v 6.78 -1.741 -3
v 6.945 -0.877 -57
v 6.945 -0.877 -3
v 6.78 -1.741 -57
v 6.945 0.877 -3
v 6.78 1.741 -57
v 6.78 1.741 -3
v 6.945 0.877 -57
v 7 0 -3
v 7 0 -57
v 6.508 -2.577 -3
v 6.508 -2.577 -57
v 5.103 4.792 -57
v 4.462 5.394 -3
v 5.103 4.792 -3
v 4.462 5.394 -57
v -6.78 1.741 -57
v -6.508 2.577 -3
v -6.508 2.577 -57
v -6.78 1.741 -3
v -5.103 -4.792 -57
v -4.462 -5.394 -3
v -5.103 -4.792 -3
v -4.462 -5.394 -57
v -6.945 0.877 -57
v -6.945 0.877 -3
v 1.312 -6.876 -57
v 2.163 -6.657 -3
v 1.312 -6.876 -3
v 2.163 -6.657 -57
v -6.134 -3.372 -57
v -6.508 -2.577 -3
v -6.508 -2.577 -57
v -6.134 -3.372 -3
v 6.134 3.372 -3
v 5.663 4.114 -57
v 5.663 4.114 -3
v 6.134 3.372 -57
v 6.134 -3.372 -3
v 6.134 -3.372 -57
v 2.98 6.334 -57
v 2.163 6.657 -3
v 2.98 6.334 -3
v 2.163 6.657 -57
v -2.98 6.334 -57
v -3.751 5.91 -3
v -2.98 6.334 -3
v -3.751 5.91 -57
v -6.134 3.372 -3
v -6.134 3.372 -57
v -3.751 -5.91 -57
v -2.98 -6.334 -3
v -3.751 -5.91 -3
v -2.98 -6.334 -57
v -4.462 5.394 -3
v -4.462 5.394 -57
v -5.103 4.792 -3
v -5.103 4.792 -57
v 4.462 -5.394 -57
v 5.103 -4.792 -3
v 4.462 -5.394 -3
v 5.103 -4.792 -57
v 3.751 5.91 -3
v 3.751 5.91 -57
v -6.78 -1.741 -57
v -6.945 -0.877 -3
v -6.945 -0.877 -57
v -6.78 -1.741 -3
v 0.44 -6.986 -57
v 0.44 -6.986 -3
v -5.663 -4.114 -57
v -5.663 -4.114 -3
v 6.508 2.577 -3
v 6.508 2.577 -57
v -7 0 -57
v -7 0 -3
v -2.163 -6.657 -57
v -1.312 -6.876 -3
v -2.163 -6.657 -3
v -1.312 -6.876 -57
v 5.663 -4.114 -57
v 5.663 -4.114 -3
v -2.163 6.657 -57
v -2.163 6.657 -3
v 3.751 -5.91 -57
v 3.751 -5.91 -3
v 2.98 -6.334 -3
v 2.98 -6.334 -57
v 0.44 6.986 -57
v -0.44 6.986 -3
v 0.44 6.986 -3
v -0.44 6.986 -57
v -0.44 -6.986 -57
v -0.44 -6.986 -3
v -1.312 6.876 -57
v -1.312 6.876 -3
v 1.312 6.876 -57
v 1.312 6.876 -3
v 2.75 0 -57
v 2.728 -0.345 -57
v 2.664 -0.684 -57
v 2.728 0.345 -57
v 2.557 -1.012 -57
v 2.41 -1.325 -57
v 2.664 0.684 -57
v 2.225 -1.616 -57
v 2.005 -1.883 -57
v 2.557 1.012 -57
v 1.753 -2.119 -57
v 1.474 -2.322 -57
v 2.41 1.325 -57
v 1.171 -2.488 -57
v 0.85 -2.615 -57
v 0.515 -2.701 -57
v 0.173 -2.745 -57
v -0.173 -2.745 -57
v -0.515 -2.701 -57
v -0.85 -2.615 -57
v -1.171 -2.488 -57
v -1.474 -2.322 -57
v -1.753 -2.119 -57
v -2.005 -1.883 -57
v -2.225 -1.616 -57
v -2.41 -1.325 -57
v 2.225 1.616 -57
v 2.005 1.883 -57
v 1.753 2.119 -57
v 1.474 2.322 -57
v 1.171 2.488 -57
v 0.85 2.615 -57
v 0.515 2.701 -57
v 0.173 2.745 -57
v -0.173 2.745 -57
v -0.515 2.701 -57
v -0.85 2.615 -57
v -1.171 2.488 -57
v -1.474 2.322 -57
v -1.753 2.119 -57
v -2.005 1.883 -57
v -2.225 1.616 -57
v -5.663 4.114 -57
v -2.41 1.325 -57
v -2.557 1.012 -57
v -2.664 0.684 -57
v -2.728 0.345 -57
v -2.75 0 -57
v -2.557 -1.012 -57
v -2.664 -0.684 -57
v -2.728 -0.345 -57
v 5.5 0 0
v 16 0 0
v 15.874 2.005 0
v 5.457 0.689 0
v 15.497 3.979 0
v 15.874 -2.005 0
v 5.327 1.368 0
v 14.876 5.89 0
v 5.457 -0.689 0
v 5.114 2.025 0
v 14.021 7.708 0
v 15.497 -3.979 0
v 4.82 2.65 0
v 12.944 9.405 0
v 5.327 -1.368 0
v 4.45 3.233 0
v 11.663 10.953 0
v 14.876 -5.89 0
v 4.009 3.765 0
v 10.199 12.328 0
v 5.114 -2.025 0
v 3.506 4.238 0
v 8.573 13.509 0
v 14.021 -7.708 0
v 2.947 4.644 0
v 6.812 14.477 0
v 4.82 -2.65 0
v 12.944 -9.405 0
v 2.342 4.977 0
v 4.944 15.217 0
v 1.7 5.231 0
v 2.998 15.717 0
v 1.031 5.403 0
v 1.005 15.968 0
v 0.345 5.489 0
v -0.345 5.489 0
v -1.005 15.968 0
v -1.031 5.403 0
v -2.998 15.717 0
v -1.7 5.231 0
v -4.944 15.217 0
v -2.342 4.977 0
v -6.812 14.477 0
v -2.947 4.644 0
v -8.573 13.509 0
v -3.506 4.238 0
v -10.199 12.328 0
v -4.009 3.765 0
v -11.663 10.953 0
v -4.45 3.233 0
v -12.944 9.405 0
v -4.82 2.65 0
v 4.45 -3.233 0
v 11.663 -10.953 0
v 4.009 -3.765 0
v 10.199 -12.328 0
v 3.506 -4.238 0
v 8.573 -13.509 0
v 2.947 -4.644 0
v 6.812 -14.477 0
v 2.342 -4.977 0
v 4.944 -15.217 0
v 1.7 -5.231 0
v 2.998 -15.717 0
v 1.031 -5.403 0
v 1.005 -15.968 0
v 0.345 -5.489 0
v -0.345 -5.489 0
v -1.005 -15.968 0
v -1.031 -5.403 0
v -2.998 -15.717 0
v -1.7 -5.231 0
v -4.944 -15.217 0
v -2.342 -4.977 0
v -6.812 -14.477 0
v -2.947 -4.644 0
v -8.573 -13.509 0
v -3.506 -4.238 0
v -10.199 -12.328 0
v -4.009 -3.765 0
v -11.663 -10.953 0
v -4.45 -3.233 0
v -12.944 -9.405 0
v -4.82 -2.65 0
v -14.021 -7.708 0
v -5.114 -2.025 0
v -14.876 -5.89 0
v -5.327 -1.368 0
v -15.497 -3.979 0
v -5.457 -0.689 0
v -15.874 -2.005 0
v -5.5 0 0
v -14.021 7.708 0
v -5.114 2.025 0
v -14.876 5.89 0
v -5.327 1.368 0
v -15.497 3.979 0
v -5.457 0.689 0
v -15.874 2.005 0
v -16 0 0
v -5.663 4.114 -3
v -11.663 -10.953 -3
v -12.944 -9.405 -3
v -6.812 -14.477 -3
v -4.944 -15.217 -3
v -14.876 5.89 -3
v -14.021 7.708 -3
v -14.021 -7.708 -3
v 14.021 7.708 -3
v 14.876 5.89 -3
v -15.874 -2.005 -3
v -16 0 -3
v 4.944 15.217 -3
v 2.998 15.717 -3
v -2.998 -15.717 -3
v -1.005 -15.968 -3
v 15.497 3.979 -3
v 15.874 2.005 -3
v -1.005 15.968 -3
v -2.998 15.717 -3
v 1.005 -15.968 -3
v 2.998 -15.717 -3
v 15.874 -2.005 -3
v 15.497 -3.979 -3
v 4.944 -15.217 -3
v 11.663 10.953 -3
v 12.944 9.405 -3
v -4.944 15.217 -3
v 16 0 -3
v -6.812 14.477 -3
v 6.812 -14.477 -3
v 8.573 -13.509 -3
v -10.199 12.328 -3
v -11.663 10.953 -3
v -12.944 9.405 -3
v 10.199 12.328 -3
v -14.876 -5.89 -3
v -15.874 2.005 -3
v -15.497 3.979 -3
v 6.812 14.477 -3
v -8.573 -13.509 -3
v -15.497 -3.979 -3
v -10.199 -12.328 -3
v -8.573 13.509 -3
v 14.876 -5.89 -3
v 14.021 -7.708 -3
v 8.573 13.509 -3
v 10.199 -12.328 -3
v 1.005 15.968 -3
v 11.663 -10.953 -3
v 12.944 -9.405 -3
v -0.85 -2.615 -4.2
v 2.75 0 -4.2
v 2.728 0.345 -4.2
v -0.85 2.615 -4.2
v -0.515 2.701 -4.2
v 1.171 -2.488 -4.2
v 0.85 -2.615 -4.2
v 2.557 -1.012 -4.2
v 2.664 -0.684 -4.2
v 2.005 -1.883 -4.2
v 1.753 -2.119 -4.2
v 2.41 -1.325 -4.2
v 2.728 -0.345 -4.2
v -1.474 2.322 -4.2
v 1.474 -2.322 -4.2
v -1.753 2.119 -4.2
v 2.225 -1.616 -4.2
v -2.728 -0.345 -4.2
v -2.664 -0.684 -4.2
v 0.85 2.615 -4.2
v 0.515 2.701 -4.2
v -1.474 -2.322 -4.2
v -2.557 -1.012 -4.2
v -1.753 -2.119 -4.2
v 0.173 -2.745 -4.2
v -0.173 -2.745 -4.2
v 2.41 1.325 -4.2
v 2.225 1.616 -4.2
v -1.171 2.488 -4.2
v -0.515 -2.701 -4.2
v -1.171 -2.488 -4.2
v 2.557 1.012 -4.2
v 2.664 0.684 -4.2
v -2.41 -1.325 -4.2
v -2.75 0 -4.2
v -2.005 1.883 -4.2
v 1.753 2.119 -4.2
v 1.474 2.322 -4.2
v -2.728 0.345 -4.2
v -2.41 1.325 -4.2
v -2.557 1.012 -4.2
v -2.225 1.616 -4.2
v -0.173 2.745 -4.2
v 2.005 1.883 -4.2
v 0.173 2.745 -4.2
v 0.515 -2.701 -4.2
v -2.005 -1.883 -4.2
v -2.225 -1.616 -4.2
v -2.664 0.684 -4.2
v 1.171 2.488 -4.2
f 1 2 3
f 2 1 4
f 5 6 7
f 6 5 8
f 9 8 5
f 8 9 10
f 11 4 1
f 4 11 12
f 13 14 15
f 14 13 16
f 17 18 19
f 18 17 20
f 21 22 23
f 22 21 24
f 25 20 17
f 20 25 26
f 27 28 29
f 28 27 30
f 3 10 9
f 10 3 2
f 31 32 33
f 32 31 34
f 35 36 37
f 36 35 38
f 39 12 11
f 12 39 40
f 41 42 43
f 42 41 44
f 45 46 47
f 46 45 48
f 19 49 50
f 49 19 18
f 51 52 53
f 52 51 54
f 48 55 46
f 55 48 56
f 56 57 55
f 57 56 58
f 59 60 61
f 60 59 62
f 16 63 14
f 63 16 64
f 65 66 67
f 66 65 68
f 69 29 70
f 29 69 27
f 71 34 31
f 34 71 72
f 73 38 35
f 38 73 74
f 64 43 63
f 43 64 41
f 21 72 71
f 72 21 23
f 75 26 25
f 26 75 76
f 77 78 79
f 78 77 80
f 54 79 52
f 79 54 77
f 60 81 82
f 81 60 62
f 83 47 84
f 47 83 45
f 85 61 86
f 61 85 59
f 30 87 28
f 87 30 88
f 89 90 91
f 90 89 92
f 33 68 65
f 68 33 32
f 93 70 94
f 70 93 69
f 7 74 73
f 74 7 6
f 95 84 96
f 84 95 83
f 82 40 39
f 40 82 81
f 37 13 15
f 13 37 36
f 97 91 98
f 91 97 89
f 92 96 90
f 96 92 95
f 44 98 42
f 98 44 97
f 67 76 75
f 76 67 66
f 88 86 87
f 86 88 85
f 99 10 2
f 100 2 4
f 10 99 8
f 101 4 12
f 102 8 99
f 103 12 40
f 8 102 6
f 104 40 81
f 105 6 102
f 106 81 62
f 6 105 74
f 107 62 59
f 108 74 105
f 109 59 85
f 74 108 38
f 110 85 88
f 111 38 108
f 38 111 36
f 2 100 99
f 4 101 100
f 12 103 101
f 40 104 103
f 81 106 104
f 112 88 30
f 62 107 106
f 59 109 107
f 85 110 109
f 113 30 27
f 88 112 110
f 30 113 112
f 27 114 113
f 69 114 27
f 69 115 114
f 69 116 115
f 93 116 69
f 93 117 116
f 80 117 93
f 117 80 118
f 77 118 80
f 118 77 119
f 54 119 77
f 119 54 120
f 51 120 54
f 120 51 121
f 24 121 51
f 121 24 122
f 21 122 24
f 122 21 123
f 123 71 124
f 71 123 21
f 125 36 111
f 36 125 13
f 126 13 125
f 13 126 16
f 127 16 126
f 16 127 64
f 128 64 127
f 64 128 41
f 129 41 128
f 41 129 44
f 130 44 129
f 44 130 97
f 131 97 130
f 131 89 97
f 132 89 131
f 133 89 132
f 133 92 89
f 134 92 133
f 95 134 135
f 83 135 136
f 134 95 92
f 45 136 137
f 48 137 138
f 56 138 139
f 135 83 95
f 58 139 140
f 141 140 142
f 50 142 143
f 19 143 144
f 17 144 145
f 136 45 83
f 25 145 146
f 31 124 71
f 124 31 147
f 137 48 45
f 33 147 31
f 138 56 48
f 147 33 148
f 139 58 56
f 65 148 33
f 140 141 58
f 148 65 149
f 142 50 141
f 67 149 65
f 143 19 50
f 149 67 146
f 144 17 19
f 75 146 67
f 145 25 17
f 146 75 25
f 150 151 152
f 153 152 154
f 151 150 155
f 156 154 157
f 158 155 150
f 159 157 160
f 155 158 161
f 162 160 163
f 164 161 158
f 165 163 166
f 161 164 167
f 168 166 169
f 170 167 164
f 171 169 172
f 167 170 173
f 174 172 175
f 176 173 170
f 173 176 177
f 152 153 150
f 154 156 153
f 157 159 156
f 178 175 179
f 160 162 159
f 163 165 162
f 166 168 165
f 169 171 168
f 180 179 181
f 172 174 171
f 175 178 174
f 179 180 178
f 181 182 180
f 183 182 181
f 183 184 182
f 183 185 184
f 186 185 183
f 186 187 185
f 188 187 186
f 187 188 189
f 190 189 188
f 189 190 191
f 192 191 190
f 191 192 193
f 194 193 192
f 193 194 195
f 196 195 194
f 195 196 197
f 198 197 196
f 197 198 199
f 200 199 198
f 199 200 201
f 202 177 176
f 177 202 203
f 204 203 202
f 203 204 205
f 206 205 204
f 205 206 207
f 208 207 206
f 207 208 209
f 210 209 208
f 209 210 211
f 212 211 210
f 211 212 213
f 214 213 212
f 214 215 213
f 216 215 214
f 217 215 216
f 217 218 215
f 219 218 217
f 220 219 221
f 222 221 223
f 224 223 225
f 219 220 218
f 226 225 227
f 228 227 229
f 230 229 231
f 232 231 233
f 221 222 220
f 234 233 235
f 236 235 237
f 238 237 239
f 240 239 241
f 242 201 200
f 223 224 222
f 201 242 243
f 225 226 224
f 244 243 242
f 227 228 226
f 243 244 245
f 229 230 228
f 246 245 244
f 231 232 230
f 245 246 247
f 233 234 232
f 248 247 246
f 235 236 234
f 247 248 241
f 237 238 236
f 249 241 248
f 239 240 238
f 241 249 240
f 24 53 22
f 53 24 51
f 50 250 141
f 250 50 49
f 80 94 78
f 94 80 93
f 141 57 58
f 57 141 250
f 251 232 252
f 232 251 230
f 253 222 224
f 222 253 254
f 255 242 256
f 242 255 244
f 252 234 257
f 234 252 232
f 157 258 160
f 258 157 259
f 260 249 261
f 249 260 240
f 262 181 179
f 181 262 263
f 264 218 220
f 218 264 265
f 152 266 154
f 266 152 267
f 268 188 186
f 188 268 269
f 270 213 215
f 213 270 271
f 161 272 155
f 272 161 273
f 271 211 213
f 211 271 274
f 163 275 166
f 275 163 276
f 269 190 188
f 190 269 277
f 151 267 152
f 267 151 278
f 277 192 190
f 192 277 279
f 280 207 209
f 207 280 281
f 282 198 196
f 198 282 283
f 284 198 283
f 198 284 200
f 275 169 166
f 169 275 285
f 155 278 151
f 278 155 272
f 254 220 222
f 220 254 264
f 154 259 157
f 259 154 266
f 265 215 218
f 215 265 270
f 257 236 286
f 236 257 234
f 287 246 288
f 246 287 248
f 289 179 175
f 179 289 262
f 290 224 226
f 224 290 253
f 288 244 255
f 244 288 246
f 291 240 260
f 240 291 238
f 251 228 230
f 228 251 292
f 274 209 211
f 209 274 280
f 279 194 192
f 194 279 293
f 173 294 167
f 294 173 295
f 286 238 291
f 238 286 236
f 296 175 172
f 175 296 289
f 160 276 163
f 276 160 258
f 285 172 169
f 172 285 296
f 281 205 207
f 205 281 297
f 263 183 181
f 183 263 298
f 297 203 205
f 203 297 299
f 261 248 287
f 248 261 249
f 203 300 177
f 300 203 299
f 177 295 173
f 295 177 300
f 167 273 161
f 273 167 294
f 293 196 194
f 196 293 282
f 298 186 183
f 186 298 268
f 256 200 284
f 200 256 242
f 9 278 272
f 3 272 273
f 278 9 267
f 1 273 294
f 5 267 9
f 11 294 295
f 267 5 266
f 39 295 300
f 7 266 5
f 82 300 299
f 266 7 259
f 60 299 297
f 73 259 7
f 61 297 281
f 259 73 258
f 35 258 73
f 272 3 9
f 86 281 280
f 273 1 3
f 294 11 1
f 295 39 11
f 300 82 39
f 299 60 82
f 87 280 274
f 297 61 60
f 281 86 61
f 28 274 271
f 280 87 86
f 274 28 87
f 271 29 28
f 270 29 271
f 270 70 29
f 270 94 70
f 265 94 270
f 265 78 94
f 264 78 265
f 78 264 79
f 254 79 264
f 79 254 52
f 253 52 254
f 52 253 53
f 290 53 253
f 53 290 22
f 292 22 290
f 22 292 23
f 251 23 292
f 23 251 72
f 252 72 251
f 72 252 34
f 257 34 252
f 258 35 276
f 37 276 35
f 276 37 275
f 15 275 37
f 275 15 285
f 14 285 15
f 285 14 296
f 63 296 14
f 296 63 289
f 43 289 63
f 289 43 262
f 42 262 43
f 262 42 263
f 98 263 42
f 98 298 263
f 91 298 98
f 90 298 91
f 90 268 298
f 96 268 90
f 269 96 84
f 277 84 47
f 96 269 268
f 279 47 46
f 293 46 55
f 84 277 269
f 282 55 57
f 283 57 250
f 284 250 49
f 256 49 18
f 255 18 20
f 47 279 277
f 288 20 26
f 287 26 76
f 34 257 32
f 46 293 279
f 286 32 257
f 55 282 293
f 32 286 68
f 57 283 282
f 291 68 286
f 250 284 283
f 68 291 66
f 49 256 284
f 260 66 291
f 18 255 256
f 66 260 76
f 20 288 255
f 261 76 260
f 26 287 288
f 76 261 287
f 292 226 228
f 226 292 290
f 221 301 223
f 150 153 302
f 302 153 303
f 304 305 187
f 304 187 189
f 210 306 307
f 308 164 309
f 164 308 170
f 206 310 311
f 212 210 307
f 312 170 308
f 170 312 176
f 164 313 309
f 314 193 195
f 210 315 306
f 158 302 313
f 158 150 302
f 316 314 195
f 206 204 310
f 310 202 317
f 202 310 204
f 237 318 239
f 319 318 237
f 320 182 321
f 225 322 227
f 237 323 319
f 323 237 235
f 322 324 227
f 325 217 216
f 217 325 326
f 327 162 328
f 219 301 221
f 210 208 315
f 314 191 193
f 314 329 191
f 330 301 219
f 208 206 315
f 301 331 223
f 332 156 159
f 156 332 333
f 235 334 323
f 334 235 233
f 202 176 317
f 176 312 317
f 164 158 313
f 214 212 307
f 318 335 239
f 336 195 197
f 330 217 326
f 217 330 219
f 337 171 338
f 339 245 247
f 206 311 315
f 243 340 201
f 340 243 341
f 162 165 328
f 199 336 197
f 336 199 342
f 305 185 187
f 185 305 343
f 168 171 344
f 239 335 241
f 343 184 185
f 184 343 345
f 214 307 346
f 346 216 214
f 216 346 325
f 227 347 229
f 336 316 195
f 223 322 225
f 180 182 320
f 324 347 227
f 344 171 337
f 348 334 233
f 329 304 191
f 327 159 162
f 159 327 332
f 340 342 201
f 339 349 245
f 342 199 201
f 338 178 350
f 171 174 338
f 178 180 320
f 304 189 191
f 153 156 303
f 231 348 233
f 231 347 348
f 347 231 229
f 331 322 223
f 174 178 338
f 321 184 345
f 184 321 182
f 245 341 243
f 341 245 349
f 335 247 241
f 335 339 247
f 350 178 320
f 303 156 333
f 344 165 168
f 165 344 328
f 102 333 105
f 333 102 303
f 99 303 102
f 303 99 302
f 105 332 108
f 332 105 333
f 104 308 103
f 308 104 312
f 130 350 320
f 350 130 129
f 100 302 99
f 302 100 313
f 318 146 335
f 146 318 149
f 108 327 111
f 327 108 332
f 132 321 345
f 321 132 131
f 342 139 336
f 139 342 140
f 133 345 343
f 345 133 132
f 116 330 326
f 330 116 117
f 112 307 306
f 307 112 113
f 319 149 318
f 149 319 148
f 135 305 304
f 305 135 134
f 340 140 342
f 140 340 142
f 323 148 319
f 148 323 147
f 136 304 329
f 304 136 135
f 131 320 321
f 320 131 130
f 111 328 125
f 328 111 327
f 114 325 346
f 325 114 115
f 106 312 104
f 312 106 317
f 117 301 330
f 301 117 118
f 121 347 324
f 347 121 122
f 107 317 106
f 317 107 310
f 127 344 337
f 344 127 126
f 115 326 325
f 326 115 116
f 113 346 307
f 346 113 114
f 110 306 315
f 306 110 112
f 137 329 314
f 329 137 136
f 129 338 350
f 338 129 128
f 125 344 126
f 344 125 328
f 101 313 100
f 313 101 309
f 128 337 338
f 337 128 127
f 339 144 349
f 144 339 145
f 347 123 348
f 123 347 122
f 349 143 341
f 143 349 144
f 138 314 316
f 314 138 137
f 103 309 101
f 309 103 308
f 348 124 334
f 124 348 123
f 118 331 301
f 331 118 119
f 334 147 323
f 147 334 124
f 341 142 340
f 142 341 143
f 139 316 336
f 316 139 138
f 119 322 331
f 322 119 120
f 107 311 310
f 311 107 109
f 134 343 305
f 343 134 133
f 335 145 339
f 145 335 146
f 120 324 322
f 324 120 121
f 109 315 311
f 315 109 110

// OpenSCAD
$fn = 50;


difference() {
	union() {
		translate(v = [0, 0, -57.0000000000]) {
			cylinder(h = 57, r = 7.0000000000);
		}
		translate(v = [0, 0, -3.0000000000]) {
			cylinder(h = 3, r = 16.0000000000);
		}
	}
	union() {
		translate(v = [0, 0, 0]) {
			rotate(a = [0, 0, 0]) {
				difference() {
					union() {
						#translate(v = [0, 0, -57.0000000000]) {
							cylinder(h = 57, r = 2.2500000000);
						}
						#translate(v = [0, 0, -4.2000000000]) {
							cylinder(h = 4.2000000000, r = 7.0000000000, r1 = 2.7500000000, r2 = 5.5000000000);
						}
						#translate(v = [0, 0, -57.0000000000]) {
							cylinder(h = 57, r = 2.7500000000);
						}
						#translate(v = [0, 0, -57.0000000000]) {
							cylinder(h = 57, r = 2.2500000000);
						}
					}
					union();
				}
			}
		}
	}
}
